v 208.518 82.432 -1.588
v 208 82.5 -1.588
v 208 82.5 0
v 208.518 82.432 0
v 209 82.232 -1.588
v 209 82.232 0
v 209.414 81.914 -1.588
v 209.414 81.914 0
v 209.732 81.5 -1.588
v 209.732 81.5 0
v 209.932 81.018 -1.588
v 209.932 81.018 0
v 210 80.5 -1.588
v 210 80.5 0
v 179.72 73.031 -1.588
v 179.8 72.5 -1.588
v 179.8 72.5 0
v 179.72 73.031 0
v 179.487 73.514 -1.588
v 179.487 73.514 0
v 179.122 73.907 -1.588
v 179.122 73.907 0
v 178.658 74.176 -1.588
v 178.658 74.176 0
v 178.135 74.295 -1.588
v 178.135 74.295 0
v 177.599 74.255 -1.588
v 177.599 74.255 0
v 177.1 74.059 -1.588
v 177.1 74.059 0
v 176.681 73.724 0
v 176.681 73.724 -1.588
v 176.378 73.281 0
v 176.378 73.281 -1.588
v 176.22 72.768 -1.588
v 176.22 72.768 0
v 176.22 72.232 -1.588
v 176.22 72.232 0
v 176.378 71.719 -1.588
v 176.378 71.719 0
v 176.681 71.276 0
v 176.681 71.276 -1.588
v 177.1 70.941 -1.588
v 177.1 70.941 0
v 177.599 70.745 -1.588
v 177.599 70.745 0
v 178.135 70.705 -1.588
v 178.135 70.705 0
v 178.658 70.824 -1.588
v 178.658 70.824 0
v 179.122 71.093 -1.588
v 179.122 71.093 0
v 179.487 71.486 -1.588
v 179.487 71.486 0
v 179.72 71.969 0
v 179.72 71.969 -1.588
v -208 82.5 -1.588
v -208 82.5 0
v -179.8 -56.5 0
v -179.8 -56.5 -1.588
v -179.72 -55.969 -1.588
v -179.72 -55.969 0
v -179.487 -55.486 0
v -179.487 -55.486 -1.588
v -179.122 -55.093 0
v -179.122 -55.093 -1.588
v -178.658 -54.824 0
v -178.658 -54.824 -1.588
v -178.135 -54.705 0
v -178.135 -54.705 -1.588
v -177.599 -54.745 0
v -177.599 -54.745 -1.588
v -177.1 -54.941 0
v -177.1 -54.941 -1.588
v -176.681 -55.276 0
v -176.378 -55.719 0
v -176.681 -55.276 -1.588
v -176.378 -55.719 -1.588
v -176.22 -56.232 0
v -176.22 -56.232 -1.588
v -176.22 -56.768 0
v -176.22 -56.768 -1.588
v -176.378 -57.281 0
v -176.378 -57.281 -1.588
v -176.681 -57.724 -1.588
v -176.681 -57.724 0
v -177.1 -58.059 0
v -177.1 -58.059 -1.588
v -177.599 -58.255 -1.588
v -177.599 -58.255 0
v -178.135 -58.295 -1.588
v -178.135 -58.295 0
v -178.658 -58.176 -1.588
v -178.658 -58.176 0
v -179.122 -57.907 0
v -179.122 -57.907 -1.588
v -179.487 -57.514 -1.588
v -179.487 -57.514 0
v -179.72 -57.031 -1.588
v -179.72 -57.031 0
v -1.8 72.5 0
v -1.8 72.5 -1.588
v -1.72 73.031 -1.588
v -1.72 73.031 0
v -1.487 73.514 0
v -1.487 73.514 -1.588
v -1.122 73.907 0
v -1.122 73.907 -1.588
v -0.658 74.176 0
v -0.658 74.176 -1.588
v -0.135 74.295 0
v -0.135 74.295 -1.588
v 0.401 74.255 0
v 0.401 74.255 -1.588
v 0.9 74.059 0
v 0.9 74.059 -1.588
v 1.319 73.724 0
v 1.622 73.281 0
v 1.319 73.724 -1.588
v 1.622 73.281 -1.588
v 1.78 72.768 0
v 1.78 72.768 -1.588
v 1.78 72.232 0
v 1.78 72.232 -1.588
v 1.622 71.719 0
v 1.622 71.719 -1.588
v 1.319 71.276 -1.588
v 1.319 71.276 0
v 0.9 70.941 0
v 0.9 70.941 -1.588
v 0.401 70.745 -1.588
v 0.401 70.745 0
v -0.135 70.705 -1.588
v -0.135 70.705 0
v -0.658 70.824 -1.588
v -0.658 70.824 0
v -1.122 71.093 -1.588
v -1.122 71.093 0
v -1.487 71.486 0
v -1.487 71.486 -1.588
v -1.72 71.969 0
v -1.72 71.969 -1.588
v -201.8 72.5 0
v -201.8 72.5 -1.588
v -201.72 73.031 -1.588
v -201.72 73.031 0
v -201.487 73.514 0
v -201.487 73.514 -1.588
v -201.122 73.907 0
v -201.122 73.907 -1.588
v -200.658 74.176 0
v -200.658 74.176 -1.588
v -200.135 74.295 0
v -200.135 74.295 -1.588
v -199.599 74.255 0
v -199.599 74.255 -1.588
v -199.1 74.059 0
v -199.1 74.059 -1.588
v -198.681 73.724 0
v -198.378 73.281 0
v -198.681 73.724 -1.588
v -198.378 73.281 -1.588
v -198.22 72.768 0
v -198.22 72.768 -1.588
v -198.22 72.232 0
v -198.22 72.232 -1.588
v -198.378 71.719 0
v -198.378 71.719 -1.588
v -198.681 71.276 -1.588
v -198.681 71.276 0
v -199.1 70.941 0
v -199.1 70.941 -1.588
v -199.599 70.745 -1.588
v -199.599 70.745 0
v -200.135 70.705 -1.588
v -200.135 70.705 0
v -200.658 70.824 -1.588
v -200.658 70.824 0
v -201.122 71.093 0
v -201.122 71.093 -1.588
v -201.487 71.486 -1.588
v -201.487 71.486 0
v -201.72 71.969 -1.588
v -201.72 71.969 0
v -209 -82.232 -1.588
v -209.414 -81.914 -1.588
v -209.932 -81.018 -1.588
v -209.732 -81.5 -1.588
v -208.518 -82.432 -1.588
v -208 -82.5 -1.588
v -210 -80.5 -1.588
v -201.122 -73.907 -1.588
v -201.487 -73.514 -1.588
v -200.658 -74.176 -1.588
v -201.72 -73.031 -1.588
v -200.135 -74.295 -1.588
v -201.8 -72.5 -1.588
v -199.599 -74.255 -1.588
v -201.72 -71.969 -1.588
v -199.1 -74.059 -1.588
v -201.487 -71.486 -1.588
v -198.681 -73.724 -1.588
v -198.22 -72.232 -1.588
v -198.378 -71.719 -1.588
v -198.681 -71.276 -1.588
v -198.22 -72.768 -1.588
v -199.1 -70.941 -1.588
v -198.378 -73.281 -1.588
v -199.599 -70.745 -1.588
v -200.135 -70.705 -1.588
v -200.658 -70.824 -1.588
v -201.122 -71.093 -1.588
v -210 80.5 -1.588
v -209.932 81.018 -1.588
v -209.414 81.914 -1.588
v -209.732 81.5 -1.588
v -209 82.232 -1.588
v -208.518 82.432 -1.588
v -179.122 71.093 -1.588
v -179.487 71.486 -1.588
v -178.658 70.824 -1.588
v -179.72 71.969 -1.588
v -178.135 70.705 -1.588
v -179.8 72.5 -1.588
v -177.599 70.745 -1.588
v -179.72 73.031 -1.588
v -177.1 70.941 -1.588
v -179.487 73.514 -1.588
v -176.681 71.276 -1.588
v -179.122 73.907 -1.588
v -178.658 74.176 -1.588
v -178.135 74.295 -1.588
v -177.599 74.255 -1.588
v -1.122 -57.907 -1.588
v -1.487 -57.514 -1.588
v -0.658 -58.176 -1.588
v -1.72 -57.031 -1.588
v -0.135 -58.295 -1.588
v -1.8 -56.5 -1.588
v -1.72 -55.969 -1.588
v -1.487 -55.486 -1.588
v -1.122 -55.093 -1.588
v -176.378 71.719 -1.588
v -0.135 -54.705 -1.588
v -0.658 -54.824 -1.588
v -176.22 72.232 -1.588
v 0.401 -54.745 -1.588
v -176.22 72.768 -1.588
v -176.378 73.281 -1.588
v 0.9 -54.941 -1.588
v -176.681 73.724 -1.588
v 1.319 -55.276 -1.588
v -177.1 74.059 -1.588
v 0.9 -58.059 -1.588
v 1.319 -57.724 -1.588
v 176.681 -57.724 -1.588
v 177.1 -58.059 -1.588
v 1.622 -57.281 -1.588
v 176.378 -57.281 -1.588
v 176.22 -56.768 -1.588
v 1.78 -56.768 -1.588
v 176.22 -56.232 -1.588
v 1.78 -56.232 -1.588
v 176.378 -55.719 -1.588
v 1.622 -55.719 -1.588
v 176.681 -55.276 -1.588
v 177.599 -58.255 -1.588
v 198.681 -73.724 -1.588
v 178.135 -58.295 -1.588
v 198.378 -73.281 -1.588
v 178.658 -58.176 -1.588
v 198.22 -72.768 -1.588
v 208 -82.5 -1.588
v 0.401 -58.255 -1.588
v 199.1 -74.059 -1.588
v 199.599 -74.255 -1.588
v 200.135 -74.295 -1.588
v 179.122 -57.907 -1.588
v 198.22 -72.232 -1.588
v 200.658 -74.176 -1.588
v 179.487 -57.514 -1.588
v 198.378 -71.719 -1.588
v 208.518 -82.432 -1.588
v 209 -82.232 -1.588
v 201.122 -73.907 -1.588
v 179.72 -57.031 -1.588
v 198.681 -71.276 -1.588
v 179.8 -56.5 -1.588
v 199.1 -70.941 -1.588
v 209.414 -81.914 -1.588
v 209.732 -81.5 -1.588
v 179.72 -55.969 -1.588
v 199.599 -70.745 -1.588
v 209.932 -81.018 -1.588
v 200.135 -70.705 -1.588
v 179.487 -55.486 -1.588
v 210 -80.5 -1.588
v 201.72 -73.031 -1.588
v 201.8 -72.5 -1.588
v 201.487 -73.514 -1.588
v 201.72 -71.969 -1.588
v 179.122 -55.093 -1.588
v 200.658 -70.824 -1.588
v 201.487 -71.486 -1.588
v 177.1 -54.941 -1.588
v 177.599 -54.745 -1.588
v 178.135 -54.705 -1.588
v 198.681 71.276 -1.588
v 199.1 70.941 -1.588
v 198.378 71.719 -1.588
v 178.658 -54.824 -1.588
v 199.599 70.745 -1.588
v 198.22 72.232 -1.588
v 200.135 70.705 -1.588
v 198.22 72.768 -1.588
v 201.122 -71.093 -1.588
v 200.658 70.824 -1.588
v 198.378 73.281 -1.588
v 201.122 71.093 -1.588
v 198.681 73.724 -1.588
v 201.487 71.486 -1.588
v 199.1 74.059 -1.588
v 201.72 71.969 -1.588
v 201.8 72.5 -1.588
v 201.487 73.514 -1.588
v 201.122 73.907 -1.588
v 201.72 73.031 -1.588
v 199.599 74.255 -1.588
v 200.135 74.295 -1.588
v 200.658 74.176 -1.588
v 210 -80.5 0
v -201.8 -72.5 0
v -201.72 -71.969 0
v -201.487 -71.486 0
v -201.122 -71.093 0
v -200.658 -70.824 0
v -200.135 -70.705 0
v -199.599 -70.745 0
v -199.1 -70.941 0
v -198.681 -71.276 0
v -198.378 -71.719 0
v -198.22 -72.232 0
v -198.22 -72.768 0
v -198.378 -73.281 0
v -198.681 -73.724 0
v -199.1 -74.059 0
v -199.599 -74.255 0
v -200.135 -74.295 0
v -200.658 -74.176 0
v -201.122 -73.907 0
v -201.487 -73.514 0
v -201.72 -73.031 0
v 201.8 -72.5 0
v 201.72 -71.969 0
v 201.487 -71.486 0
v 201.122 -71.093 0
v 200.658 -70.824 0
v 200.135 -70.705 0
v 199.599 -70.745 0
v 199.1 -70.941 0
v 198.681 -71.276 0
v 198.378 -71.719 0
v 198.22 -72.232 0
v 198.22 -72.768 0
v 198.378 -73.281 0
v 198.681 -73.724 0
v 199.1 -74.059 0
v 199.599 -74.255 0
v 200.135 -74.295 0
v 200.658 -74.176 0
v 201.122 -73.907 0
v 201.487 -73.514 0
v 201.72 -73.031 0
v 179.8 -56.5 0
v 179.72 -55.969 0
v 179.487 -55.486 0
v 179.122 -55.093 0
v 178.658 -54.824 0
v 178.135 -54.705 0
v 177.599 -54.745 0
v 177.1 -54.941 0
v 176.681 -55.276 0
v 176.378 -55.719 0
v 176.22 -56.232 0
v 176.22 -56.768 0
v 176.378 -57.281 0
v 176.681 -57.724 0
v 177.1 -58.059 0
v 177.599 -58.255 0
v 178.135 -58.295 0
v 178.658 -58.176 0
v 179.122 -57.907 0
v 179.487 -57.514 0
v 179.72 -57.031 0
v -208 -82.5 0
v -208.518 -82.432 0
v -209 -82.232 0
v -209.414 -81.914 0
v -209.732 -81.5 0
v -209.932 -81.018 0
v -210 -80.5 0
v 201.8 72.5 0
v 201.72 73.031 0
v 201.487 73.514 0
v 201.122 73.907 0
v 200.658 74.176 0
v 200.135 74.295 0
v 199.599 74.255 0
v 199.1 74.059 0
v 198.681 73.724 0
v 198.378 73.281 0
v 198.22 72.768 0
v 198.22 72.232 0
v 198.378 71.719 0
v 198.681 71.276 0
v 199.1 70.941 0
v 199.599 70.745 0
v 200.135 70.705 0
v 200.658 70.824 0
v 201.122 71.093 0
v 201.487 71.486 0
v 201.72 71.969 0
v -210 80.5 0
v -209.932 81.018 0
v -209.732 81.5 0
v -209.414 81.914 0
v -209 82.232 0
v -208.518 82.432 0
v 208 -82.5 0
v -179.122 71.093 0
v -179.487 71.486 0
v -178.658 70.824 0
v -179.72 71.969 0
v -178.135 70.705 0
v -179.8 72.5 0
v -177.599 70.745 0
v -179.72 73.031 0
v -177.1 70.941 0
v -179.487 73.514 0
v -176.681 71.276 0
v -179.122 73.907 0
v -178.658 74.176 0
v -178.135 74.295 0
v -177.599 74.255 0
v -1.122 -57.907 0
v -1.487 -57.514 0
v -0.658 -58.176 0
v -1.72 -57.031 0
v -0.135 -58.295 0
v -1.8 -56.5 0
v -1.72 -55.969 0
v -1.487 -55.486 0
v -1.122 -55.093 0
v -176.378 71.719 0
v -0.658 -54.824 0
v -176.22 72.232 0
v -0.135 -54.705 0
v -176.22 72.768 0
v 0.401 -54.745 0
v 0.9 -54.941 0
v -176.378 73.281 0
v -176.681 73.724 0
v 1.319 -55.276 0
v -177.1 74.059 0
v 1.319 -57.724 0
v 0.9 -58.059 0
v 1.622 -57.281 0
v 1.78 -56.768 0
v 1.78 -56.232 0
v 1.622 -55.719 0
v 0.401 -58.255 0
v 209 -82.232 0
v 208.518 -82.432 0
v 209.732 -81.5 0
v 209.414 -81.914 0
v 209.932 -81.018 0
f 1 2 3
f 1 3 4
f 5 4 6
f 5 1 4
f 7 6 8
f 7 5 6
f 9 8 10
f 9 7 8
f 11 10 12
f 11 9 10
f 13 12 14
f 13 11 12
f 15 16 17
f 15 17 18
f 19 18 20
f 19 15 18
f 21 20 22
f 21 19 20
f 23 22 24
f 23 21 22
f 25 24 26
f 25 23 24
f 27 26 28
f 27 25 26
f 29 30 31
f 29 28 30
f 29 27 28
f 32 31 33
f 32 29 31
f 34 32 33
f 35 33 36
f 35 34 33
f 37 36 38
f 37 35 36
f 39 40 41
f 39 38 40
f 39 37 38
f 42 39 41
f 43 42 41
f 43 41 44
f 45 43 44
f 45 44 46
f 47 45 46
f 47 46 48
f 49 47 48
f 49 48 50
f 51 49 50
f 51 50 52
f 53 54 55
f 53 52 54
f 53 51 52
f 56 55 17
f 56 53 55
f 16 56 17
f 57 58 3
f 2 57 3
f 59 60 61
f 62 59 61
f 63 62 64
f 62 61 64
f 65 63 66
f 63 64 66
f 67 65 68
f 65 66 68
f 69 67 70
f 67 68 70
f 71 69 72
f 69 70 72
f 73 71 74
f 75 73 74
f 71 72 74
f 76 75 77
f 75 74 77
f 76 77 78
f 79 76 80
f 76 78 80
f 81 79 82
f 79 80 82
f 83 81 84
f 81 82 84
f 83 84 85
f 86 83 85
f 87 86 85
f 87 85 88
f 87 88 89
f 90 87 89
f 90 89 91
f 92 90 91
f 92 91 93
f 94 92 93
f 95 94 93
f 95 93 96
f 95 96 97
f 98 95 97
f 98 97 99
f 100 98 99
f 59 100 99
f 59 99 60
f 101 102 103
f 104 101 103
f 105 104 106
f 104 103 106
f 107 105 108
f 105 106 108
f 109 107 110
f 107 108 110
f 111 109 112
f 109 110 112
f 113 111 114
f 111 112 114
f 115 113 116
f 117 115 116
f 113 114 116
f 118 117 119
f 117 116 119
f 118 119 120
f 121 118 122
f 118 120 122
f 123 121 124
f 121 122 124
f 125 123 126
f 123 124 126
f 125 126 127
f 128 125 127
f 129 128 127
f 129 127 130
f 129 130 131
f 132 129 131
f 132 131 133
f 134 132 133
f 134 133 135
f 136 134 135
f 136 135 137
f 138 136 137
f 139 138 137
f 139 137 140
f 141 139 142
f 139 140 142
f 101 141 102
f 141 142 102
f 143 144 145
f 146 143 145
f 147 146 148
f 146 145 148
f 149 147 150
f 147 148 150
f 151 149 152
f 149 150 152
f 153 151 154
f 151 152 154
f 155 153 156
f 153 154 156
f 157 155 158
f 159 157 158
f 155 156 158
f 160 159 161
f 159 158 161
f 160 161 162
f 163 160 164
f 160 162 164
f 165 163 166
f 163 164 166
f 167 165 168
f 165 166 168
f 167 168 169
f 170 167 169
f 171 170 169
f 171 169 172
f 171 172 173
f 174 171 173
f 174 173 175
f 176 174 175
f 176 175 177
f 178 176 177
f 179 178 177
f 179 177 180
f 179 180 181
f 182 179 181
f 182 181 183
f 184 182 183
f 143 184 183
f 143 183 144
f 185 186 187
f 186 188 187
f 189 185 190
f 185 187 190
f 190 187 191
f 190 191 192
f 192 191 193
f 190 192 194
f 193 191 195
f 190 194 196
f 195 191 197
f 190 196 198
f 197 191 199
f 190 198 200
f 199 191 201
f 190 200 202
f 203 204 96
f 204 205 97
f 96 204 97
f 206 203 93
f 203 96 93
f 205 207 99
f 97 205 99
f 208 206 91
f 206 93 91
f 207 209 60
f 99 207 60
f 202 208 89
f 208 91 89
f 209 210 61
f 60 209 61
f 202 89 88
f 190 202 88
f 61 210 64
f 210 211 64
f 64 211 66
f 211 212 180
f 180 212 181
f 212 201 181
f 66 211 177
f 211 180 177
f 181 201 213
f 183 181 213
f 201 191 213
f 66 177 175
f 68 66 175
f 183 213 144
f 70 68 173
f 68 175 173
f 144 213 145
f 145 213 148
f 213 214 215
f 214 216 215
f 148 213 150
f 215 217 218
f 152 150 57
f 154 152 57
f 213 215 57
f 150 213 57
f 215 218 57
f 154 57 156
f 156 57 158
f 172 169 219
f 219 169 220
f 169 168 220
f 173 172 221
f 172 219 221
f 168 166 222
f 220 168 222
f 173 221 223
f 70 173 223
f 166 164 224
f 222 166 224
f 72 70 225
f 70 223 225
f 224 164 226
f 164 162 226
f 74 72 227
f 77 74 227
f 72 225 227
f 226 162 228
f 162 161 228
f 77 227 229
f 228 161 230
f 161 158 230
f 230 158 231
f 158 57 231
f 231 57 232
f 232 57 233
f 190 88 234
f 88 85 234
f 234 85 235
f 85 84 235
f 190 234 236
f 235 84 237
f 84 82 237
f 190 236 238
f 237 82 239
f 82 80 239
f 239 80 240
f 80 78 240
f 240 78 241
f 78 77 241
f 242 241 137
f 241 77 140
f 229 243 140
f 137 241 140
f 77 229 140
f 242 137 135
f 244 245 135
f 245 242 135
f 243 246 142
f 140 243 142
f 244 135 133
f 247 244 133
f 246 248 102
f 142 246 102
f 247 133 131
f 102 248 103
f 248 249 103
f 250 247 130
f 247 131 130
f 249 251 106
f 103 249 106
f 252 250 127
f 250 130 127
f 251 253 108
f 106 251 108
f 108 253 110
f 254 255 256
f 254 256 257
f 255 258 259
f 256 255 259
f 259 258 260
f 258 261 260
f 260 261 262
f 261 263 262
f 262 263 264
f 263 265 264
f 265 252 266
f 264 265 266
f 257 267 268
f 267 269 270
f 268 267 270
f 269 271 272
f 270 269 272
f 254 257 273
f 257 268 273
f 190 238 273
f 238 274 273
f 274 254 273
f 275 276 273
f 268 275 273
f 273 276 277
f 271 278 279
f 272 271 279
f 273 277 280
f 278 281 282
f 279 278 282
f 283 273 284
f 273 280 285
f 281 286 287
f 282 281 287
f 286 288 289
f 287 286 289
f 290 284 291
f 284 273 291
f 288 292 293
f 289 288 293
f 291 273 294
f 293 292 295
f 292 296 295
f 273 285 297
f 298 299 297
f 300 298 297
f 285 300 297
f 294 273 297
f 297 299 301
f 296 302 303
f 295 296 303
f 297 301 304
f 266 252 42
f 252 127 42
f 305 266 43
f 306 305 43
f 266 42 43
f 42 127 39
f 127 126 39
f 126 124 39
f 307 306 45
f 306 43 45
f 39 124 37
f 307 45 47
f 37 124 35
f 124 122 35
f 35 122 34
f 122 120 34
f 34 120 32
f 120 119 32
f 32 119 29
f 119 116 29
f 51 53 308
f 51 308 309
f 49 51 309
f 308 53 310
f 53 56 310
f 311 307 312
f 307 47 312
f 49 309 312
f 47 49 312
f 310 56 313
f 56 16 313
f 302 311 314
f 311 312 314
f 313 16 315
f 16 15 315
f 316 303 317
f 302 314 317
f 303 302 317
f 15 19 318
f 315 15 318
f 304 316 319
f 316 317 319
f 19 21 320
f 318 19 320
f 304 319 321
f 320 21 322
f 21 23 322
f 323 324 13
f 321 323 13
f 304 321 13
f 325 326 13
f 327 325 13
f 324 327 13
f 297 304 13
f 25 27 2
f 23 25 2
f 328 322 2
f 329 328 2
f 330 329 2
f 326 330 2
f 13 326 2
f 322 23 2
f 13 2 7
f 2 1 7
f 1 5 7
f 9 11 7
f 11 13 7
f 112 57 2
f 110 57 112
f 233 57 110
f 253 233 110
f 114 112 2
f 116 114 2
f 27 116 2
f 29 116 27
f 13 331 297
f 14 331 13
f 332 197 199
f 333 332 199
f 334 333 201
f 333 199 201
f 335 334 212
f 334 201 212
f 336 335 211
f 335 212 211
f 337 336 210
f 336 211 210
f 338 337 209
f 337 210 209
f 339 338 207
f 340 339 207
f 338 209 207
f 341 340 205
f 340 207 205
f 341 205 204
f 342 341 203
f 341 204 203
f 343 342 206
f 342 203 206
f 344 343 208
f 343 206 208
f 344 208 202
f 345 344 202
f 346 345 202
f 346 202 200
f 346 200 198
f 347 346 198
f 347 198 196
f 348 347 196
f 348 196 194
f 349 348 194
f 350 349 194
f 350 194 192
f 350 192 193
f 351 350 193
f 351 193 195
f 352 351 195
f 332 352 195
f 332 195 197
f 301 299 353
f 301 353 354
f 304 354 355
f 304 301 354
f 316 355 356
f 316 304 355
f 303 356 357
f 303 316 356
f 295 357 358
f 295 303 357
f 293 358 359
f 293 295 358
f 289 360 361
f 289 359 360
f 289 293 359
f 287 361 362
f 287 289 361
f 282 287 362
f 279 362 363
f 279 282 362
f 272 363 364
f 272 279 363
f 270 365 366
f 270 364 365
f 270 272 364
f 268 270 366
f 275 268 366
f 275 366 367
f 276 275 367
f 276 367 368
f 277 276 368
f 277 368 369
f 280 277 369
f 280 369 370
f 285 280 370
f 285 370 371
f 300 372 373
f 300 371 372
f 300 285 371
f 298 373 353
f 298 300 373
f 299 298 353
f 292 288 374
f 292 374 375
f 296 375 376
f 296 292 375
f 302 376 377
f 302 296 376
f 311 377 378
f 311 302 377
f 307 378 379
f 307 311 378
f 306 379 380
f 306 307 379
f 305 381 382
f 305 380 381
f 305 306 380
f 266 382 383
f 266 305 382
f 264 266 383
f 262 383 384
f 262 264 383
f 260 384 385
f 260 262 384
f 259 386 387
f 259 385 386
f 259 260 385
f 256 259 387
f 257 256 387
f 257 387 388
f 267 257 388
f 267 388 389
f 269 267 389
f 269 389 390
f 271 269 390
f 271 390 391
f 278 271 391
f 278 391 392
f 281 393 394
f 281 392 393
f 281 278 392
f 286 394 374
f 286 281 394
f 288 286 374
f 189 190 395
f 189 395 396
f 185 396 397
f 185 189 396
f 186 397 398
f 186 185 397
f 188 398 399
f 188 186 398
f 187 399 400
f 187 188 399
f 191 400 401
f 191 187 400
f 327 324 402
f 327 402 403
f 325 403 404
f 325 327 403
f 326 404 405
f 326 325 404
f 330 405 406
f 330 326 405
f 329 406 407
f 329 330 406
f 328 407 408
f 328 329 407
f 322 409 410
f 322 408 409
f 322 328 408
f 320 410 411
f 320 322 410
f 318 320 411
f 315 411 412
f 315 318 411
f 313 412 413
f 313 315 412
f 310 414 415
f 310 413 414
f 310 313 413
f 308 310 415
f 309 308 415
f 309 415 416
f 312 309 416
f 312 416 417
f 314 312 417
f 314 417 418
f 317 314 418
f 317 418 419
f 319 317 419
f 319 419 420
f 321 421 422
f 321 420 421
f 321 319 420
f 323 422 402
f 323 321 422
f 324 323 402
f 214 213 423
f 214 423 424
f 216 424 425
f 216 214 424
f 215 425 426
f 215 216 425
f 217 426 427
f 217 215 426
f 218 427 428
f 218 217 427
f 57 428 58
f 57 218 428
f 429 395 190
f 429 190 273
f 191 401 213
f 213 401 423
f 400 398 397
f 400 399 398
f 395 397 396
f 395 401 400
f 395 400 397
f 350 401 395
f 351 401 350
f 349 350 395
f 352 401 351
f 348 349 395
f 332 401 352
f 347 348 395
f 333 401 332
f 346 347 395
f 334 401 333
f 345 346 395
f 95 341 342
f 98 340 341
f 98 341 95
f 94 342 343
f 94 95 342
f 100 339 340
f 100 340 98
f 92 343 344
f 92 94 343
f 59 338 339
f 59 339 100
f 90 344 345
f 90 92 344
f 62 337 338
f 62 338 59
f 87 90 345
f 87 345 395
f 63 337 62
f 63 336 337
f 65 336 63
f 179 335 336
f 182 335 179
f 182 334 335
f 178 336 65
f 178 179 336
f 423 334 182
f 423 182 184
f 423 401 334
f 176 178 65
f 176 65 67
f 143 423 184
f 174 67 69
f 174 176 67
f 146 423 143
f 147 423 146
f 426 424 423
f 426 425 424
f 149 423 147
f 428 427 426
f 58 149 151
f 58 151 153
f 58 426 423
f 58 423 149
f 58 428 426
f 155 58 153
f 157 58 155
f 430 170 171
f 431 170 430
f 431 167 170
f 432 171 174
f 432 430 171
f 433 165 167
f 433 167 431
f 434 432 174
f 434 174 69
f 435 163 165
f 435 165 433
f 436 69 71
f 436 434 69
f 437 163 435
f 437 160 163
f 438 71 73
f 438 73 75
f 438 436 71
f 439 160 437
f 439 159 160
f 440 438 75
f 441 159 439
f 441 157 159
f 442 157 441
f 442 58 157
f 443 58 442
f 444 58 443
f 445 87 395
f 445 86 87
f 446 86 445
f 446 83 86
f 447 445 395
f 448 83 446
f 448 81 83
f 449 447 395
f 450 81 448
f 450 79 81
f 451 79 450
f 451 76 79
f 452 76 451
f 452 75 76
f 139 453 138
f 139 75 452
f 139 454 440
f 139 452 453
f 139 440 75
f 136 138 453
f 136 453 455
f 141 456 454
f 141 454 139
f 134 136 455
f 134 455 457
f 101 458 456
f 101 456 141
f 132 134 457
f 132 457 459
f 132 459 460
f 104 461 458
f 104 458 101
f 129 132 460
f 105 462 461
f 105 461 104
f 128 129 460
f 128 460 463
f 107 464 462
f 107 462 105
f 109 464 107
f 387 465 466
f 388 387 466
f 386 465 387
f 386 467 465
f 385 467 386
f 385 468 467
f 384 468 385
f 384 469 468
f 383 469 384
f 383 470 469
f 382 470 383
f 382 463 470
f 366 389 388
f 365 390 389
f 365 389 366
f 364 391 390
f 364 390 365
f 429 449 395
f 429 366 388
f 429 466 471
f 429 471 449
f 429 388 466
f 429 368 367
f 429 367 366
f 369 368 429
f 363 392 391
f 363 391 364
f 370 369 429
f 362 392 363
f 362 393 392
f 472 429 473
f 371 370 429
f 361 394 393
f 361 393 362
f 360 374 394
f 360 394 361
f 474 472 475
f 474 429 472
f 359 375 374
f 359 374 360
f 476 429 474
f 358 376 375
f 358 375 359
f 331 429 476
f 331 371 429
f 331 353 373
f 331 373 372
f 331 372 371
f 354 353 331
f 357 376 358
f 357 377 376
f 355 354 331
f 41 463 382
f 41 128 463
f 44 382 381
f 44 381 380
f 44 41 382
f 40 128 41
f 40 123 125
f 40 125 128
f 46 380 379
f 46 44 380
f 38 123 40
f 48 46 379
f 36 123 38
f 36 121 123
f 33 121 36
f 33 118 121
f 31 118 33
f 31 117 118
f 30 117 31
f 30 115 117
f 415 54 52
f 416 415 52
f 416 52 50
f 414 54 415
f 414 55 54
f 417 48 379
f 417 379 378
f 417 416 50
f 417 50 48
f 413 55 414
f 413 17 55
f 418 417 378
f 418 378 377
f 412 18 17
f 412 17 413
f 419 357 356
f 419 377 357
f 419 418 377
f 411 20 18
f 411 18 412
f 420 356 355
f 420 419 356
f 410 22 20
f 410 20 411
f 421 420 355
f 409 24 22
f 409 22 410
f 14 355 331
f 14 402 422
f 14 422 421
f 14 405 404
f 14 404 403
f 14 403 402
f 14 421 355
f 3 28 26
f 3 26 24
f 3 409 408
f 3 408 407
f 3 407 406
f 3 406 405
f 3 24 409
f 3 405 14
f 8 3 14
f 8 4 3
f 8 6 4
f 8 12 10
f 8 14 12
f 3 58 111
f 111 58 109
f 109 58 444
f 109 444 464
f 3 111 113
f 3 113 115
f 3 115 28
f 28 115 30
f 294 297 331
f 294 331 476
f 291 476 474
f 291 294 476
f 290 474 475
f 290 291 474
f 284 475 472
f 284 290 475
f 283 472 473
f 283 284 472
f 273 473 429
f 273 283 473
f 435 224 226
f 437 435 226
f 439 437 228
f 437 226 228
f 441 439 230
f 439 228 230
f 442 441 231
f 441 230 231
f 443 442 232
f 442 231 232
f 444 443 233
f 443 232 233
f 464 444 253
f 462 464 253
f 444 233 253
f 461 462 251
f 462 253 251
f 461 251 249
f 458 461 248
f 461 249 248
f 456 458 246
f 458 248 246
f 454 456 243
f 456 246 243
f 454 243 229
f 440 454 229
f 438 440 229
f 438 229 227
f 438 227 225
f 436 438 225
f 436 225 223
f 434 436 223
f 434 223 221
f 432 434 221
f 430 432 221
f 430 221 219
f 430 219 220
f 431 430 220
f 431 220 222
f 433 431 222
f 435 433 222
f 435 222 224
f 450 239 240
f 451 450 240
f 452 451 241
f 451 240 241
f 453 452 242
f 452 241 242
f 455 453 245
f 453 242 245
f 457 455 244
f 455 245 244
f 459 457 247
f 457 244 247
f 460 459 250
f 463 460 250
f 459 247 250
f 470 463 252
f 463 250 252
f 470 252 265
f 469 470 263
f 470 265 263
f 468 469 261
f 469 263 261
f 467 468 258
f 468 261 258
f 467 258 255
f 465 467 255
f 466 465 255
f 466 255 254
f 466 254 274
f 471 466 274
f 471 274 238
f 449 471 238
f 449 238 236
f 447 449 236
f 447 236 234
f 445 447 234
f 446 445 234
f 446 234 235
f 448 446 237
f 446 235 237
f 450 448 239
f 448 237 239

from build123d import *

# Parameters (mm, degrees)
SKETCH1_W            = 420
SKETCH1_H            = 165
BASE_FLANGE1_DEPTH   = 1.588
BREAK_CORNER1_START  = -1.588
BREAK_CORNER1_DEPTH  = 1.588
M3_CLEARANCE_HOLE1_D = 3.6


# Read off the part's stored shape, not the designer's step: Break-Corner1
# Sheet-metal steps are written as plain solids
with BuildPart() as part:
    # Sketch1 → Base-Flange1 (new body)
    with BuildSketch(Plane.XY):
        Rectangle(SKETCH1_W, SKETCH1_H)
    extrude(amount=-BASE_FLANGE1_DEPTH)

    # Break-Corner1 outline → Break-Corner1 (cut)
    with BuildSketch(Plane.XY.offset(BREAK_CORNER1_START)):
        with BuildLine():
            ThreePointArc((208, 82.5), (209.414213562, 81.914213562), (210, 80.5))
            Line((210, 80.5), (210, 82.5))
            Line((210, 82.5), (208, 82.5))
        make_face()
        with BuildLine():
            Line((210, -82.5), (210, -80.5))
            ThreePointArc((210, -80.5), (209.414213562, -81.914213562), (208, -82.5))
            Line((208, -82.5), (210, -82.5))
        make_face()
        with BuildLine():
            ThreePointArc((-210, 80.5), (-209.414213562, 81.914213562), (-208, 82.5))
            Line((-208, 82.5), (-210, 82.5))
            Line((-210, 82.5), (-210, 80.5))
        make_face()
        with BuildLine():
            Line((-210, -82.5), (-208, -82.5))
            ThreePointArc((-208, -82.5), (-209.414213562, -81.914213562), (-210, -80.5))
            Line((-210, -80.5), (-210, -82.5))
        make_face()
    extrude(amount=BREAK_CORNER1_DEPTH, mode=Mode.SUBTRACT)

    # M3 Clearance Hole1 (through all)
    with Locations(Plane.XY):
        with Locations((-200, 72.5), (-178, 72.5), (0, 72.5), (0, -56.5), (-178, -56.5), (-200, -72.5)):
            m3_clearance_hole1 = Hole(M3_CLEARANCE_HOLE1_D / 2)

    # Mirror3: M3 Clearance Hole1 across plane
    add(m3_clearance_hole1.mirror(Plane(origin=(0, 0, 0), x_dir=(0, 0, 1), z_dir=(1, 0, 0))), mode=Mode.SUBTRACT)


solid = part.part
